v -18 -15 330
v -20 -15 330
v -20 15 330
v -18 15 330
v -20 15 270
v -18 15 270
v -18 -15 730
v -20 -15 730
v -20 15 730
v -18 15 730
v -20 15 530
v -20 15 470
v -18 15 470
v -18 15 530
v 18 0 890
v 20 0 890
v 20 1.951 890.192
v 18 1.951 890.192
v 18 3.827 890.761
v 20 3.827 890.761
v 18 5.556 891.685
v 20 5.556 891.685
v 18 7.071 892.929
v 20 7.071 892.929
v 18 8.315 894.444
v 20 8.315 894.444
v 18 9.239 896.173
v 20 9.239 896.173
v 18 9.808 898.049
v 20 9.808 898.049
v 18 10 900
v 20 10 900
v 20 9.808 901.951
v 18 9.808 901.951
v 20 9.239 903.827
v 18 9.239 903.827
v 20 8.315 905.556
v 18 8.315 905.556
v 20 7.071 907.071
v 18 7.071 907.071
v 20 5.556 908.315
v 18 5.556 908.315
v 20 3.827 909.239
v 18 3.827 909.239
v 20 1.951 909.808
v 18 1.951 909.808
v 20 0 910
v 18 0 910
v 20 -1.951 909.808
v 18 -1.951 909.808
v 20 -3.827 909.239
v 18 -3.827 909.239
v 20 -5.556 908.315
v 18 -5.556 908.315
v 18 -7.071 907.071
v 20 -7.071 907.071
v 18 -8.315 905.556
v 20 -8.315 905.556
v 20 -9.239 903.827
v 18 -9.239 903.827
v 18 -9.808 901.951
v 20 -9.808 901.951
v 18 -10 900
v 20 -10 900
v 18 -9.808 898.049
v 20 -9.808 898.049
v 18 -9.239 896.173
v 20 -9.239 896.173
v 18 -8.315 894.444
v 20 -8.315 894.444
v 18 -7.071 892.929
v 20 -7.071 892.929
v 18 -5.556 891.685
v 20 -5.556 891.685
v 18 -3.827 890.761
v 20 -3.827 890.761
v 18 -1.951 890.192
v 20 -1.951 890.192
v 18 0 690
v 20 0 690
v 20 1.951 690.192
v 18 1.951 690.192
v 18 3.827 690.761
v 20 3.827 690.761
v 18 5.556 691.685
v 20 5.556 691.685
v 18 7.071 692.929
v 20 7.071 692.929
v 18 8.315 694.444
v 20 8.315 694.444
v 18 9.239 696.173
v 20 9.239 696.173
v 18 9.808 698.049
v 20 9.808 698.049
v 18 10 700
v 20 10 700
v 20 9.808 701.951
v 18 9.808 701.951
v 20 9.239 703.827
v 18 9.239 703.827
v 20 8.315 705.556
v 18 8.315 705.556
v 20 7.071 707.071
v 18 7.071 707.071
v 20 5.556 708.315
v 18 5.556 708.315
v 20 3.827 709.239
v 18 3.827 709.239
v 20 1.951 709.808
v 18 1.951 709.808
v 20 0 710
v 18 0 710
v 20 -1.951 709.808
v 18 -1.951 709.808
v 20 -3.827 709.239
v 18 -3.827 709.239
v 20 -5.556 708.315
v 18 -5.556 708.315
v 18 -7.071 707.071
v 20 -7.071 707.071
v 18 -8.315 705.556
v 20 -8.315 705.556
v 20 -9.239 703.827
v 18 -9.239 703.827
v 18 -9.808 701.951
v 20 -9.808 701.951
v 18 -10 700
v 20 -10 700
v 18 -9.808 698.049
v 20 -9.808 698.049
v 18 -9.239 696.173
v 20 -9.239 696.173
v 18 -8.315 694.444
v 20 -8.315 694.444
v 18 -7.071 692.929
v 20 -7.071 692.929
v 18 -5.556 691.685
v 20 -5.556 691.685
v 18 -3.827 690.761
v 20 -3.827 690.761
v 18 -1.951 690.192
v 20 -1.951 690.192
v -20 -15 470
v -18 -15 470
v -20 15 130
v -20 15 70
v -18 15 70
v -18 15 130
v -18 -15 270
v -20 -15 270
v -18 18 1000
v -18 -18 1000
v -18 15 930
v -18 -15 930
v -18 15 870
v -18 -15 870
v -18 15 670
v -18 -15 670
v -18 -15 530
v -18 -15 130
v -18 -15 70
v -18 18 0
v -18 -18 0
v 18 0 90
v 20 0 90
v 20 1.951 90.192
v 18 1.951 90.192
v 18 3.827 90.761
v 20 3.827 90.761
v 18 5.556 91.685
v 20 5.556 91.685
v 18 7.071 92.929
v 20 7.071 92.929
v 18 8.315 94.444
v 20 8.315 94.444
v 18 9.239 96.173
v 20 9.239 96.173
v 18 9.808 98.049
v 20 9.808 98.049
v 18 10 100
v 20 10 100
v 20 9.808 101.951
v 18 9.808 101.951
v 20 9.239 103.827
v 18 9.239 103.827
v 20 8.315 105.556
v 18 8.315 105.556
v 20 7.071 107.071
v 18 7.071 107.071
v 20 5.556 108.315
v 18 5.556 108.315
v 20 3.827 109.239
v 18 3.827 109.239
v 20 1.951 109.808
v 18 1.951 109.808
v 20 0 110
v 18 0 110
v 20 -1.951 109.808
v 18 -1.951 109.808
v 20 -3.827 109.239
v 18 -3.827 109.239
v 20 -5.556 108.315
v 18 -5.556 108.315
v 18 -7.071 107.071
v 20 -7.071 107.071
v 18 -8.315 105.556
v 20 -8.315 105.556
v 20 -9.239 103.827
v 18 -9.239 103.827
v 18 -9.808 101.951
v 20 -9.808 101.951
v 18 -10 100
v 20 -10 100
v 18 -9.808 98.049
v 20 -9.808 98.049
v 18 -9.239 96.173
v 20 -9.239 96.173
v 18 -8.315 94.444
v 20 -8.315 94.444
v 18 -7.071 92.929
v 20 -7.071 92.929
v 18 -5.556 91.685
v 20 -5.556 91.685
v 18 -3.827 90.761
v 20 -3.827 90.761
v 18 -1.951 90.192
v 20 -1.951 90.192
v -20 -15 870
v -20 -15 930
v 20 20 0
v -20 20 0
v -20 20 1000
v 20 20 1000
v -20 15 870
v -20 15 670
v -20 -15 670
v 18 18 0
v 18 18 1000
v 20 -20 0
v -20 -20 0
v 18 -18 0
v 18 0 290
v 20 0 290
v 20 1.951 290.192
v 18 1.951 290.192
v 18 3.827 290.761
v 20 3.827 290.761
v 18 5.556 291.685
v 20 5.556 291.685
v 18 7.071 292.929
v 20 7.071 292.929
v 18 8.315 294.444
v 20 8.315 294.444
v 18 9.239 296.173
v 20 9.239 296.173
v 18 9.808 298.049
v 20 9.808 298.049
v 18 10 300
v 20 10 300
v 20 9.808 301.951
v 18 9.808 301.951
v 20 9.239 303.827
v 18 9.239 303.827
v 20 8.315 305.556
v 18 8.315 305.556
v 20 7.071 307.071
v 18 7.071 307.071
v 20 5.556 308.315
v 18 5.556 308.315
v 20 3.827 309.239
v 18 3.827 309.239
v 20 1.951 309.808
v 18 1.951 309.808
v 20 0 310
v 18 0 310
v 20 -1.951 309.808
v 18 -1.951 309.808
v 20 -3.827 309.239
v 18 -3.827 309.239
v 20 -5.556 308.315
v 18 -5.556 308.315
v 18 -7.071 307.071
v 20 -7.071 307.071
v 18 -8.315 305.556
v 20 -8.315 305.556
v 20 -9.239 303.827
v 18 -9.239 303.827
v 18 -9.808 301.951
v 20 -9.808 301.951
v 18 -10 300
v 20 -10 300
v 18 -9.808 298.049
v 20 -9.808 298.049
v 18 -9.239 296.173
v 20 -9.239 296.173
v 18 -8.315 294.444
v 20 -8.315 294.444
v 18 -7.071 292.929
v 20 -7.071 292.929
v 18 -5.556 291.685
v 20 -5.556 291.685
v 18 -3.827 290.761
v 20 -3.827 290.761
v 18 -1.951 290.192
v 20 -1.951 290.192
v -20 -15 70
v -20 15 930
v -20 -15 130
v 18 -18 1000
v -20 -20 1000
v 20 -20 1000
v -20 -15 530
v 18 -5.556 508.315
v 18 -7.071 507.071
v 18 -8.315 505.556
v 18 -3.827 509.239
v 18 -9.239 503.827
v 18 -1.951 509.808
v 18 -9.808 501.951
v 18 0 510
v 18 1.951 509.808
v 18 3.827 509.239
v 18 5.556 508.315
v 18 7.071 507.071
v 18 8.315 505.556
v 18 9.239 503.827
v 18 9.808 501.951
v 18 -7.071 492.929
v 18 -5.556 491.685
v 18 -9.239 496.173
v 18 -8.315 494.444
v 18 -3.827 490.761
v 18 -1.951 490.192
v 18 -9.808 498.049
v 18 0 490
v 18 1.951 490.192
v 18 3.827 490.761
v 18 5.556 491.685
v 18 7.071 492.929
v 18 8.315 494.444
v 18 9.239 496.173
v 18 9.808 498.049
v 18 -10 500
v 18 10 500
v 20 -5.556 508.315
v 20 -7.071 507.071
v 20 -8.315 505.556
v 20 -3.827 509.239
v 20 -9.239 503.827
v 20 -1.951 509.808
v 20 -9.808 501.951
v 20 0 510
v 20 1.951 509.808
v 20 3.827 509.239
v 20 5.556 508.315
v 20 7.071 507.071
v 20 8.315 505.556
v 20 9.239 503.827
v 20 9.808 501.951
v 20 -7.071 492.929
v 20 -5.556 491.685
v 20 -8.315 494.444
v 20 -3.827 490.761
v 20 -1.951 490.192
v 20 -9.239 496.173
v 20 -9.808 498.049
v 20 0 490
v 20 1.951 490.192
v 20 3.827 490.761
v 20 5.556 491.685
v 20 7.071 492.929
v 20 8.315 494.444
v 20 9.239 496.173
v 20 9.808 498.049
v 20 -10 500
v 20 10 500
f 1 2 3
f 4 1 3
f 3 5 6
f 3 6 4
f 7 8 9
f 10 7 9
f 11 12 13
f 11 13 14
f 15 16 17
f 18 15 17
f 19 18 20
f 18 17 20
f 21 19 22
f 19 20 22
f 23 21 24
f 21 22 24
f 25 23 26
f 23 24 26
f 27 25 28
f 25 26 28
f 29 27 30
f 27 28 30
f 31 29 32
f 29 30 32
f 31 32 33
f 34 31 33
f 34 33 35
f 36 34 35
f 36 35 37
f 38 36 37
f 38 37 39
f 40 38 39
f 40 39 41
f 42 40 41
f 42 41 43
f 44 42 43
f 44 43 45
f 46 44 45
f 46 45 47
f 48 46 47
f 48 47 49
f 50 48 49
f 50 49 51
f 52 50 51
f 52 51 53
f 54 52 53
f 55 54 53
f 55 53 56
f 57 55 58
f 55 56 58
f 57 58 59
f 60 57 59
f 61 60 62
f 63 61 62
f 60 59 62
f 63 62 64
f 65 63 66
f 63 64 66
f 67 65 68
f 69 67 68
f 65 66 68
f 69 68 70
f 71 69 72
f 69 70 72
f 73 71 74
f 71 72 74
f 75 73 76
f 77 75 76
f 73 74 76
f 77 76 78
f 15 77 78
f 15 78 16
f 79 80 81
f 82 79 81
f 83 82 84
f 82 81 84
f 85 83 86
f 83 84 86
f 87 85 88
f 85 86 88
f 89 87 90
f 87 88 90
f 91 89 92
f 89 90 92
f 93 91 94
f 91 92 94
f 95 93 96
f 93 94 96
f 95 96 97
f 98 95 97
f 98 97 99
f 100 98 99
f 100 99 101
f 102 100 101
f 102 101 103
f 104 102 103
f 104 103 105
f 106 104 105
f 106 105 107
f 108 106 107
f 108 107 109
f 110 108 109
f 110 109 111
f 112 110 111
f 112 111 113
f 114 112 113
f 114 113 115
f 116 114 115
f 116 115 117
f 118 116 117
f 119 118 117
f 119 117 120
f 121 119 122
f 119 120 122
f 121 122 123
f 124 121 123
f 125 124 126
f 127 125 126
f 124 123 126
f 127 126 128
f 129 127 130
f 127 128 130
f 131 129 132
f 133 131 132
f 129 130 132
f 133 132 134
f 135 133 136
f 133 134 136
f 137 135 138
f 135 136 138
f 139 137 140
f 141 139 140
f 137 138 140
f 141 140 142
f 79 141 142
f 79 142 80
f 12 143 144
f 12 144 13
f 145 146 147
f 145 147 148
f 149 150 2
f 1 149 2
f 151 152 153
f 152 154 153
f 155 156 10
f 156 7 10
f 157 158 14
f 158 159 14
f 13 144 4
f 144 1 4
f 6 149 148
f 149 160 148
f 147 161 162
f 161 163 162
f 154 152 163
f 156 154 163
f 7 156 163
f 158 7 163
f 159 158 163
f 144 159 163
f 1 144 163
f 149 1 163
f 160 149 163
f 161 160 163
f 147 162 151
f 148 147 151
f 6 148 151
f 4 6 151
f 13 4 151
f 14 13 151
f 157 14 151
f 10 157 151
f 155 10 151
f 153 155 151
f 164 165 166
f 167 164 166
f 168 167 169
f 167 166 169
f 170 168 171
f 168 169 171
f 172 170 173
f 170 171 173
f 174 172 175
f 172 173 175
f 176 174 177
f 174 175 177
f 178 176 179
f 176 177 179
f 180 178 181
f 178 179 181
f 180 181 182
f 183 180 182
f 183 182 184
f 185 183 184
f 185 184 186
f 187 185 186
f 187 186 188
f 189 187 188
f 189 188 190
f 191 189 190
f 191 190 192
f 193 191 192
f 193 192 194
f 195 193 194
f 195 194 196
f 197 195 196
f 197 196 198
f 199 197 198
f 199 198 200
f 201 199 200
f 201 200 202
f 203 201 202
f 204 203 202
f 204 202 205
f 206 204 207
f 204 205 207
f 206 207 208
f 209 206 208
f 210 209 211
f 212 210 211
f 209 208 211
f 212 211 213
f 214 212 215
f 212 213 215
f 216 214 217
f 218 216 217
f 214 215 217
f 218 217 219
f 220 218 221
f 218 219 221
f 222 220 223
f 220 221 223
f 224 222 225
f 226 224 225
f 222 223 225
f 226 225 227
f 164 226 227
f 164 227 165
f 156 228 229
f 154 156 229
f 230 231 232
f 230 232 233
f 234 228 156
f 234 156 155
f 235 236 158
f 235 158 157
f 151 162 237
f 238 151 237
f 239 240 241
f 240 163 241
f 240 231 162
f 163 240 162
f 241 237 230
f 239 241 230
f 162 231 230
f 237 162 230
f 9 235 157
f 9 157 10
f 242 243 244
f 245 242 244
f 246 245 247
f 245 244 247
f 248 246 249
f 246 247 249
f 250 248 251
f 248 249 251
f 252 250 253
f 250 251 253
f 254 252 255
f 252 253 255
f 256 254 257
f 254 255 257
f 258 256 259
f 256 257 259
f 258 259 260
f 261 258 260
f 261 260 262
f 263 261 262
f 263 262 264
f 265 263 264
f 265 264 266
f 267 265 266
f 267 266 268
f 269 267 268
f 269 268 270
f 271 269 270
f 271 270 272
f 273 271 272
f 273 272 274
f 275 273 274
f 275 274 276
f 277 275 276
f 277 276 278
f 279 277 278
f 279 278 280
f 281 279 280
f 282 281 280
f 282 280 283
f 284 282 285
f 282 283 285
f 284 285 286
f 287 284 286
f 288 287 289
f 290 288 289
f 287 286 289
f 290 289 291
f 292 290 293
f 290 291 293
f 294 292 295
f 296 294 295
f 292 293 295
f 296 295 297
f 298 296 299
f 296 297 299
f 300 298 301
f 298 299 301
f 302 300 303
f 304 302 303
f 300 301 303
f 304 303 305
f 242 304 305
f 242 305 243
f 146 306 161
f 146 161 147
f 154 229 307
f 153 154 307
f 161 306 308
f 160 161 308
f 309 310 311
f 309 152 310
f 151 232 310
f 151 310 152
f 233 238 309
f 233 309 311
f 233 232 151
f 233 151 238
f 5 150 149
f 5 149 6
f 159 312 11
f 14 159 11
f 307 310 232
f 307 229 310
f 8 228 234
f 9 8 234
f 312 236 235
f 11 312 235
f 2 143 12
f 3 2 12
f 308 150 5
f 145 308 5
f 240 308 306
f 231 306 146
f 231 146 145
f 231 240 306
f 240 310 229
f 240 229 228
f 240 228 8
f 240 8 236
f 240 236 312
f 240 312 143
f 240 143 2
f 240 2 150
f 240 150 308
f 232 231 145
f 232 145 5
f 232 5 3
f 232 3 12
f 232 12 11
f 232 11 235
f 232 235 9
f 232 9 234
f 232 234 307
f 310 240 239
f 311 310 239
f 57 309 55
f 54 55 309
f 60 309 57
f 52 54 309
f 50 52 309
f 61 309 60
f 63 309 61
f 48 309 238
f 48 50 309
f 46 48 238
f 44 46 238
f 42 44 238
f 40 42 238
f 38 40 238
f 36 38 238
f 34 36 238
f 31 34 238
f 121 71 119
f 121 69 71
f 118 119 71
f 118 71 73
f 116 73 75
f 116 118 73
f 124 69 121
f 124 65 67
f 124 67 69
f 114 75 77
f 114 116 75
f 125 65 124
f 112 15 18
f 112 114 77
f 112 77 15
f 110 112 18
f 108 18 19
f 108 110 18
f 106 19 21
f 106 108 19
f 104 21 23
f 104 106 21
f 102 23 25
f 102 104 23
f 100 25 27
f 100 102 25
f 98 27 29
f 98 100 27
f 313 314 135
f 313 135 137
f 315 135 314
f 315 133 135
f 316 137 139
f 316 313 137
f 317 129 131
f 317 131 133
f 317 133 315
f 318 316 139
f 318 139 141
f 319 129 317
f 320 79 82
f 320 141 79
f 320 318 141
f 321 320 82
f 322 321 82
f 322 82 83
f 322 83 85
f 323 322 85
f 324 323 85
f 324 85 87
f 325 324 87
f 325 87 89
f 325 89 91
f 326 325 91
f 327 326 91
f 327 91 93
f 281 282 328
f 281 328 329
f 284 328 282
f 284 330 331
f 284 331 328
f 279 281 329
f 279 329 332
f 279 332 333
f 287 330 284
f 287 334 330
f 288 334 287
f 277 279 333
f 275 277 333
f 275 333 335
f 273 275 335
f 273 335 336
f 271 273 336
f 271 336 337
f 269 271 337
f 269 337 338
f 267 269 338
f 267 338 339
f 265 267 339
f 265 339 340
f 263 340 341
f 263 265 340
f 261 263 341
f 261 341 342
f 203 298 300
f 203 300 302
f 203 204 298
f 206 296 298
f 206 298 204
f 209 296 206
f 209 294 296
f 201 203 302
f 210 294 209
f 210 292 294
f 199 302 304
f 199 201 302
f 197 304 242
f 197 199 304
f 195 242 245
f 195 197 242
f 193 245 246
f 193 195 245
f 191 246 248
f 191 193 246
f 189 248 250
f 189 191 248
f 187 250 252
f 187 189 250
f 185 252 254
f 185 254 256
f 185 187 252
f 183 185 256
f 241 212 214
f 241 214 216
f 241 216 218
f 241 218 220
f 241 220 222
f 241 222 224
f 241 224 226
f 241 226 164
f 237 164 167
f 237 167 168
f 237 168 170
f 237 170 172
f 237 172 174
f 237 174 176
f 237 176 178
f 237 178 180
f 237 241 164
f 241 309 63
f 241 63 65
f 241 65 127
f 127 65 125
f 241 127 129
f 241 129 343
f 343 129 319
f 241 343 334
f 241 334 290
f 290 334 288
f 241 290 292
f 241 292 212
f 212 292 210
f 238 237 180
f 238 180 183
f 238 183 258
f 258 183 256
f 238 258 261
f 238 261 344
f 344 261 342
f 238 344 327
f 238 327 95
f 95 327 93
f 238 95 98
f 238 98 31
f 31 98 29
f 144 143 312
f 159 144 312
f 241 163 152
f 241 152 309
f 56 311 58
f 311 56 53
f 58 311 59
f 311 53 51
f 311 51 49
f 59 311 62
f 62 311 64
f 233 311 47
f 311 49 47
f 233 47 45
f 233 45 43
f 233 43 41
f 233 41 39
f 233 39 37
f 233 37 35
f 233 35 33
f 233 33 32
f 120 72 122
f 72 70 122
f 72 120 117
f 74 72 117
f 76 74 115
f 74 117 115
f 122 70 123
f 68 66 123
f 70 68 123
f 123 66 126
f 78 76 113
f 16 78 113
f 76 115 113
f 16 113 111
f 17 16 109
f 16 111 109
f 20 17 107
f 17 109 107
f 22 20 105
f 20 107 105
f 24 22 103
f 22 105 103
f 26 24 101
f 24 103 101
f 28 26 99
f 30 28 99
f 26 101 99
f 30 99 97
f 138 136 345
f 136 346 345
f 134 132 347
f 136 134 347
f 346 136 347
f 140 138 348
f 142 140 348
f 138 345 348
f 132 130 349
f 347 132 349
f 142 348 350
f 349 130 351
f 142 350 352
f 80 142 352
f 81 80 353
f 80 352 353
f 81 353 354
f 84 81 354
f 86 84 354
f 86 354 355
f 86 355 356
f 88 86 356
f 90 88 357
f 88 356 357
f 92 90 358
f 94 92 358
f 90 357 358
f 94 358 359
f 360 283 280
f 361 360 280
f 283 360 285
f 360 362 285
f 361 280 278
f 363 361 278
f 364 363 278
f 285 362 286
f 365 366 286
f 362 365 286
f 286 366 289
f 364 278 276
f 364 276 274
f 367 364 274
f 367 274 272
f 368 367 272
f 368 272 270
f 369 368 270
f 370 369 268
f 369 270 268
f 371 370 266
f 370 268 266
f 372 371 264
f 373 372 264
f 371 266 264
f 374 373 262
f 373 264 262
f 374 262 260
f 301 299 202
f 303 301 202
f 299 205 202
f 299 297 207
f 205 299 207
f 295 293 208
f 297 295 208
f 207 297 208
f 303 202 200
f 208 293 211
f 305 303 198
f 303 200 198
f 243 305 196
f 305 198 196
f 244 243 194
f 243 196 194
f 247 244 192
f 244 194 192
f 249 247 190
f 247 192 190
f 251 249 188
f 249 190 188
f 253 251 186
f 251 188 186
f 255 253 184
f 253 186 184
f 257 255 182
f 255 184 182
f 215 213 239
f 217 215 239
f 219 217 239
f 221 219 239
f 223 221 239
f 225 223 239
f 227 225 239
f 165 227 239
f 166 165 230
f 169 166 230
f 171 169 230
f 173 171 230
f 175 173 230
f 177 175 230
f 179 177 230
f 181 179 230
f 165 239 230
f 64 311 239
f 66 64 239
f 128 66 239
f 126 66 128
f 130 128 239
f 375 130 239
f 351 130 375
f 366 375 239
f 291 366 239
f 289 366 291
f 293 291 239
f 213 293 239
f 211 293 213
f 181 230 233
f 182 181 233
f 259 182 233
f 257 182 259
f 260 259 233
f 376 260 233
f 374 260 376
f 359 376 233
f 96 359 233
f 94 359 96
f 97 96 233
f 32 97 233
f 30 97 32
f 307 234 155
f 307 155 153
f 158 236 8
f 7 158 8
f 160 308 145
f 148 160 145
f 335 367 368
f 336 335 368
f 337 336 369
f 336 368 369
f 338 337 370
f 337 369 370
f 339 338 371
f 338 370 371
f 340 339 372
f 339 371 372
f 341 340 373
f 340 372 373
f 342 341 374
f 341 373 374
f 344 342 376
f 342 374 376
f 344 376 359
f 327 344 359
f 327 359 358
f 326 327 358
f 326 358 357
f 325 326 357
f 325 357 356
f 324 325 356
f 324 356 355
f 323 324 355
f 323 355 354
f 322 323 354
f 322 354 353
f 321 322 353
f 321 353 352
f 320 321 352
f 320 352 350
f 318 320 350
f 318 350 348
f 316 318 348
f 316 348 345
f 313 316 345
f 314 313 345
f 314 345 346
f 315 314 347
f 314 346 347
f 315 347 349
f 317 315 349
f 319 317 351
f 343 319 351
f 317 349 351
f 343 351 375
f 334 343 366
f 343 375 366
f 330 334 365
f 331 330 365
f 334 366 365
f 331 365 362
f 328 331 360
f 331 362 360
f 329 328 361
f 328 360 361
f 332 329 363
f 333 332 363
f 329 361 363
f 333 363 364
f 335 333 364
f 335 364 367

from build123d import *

# Parameters (mm, degrees)
CROQUIS1_W            = 40
CROQUIS1_H            = 40
CROQUIS1_W_2          = 36
CROQUIS1_H_2          = 36
EXTRUIR_L_MINA1_DEPTH = 1000
CROQUIS2_R            = 10
EXTRUIR1_DEPTH        = 10
CROQUIS3_W            = 60
CROQUIS3_H            = 30
EXTRUIR2_DEPTH        = 10


with BuildPart() as part:
    # Croquis1 → Extruir-Lámina1 (new body)
    with BuildSketch(Plane.XY):
        Rectangle(CROQUIS1_W, CROQUIS1_H)
        Rectangle(CROQUIS1_W_2, CROQUIS1_H_2, mode=Mode.SUBTRACT)
    extrude(amount=EXTRUIR_L_MINA1_DEPTH)

    # Croquis2 → Extruir1 (cut)
    with BuildSketch(Plane(origin=(20, 0, 0), x_dir=(0, 0, -1), z_dir=(1, 0, 0))):
        with Locations((-500, 0)):
            Circle(CROQUIS2_R)
        with Locations((-300, 0)):
            Circle(CROQUIS2_R)
        with Locations((-100, 0)):
            Circle(CROQUIS2_R)
        with Locations((-700, 0)):
            Circle(CROQUIS2_R)
        with Locations((-900, 0)):
            Circle(CROQUIS2_R)
    extrude(amount=-EXTRUIR1_DEPTH, mode=Mode.SUBTRACT)

    # Croquis3 → Extruir2 (cut)
    with BuildSketch(Plane.ZY.offset(20)):
        with Locations((100, 0)):
            Rectangle(CROQUIS3_W, CROQUIS3_H)
        with Locations((300, 0)):
            Rectangle(CROQUIS3_W, CROQUIS3_H)
        with Locations((500, 0)):
            Rectangle(CROQUIS3_W, CROQUIS3_H)
        with Locations((700, 0)):
            Rectangle(CROQUIS3_W, CROQUIS3_H)
        with Locations((900, 0)):
            Rectangle(CROQUIS3_W, CROQUIS3_H)
    extrude(amount=-EXTRUIR2_DEPTH, mode=Mode.SUBTRACT)


solid = part.part
